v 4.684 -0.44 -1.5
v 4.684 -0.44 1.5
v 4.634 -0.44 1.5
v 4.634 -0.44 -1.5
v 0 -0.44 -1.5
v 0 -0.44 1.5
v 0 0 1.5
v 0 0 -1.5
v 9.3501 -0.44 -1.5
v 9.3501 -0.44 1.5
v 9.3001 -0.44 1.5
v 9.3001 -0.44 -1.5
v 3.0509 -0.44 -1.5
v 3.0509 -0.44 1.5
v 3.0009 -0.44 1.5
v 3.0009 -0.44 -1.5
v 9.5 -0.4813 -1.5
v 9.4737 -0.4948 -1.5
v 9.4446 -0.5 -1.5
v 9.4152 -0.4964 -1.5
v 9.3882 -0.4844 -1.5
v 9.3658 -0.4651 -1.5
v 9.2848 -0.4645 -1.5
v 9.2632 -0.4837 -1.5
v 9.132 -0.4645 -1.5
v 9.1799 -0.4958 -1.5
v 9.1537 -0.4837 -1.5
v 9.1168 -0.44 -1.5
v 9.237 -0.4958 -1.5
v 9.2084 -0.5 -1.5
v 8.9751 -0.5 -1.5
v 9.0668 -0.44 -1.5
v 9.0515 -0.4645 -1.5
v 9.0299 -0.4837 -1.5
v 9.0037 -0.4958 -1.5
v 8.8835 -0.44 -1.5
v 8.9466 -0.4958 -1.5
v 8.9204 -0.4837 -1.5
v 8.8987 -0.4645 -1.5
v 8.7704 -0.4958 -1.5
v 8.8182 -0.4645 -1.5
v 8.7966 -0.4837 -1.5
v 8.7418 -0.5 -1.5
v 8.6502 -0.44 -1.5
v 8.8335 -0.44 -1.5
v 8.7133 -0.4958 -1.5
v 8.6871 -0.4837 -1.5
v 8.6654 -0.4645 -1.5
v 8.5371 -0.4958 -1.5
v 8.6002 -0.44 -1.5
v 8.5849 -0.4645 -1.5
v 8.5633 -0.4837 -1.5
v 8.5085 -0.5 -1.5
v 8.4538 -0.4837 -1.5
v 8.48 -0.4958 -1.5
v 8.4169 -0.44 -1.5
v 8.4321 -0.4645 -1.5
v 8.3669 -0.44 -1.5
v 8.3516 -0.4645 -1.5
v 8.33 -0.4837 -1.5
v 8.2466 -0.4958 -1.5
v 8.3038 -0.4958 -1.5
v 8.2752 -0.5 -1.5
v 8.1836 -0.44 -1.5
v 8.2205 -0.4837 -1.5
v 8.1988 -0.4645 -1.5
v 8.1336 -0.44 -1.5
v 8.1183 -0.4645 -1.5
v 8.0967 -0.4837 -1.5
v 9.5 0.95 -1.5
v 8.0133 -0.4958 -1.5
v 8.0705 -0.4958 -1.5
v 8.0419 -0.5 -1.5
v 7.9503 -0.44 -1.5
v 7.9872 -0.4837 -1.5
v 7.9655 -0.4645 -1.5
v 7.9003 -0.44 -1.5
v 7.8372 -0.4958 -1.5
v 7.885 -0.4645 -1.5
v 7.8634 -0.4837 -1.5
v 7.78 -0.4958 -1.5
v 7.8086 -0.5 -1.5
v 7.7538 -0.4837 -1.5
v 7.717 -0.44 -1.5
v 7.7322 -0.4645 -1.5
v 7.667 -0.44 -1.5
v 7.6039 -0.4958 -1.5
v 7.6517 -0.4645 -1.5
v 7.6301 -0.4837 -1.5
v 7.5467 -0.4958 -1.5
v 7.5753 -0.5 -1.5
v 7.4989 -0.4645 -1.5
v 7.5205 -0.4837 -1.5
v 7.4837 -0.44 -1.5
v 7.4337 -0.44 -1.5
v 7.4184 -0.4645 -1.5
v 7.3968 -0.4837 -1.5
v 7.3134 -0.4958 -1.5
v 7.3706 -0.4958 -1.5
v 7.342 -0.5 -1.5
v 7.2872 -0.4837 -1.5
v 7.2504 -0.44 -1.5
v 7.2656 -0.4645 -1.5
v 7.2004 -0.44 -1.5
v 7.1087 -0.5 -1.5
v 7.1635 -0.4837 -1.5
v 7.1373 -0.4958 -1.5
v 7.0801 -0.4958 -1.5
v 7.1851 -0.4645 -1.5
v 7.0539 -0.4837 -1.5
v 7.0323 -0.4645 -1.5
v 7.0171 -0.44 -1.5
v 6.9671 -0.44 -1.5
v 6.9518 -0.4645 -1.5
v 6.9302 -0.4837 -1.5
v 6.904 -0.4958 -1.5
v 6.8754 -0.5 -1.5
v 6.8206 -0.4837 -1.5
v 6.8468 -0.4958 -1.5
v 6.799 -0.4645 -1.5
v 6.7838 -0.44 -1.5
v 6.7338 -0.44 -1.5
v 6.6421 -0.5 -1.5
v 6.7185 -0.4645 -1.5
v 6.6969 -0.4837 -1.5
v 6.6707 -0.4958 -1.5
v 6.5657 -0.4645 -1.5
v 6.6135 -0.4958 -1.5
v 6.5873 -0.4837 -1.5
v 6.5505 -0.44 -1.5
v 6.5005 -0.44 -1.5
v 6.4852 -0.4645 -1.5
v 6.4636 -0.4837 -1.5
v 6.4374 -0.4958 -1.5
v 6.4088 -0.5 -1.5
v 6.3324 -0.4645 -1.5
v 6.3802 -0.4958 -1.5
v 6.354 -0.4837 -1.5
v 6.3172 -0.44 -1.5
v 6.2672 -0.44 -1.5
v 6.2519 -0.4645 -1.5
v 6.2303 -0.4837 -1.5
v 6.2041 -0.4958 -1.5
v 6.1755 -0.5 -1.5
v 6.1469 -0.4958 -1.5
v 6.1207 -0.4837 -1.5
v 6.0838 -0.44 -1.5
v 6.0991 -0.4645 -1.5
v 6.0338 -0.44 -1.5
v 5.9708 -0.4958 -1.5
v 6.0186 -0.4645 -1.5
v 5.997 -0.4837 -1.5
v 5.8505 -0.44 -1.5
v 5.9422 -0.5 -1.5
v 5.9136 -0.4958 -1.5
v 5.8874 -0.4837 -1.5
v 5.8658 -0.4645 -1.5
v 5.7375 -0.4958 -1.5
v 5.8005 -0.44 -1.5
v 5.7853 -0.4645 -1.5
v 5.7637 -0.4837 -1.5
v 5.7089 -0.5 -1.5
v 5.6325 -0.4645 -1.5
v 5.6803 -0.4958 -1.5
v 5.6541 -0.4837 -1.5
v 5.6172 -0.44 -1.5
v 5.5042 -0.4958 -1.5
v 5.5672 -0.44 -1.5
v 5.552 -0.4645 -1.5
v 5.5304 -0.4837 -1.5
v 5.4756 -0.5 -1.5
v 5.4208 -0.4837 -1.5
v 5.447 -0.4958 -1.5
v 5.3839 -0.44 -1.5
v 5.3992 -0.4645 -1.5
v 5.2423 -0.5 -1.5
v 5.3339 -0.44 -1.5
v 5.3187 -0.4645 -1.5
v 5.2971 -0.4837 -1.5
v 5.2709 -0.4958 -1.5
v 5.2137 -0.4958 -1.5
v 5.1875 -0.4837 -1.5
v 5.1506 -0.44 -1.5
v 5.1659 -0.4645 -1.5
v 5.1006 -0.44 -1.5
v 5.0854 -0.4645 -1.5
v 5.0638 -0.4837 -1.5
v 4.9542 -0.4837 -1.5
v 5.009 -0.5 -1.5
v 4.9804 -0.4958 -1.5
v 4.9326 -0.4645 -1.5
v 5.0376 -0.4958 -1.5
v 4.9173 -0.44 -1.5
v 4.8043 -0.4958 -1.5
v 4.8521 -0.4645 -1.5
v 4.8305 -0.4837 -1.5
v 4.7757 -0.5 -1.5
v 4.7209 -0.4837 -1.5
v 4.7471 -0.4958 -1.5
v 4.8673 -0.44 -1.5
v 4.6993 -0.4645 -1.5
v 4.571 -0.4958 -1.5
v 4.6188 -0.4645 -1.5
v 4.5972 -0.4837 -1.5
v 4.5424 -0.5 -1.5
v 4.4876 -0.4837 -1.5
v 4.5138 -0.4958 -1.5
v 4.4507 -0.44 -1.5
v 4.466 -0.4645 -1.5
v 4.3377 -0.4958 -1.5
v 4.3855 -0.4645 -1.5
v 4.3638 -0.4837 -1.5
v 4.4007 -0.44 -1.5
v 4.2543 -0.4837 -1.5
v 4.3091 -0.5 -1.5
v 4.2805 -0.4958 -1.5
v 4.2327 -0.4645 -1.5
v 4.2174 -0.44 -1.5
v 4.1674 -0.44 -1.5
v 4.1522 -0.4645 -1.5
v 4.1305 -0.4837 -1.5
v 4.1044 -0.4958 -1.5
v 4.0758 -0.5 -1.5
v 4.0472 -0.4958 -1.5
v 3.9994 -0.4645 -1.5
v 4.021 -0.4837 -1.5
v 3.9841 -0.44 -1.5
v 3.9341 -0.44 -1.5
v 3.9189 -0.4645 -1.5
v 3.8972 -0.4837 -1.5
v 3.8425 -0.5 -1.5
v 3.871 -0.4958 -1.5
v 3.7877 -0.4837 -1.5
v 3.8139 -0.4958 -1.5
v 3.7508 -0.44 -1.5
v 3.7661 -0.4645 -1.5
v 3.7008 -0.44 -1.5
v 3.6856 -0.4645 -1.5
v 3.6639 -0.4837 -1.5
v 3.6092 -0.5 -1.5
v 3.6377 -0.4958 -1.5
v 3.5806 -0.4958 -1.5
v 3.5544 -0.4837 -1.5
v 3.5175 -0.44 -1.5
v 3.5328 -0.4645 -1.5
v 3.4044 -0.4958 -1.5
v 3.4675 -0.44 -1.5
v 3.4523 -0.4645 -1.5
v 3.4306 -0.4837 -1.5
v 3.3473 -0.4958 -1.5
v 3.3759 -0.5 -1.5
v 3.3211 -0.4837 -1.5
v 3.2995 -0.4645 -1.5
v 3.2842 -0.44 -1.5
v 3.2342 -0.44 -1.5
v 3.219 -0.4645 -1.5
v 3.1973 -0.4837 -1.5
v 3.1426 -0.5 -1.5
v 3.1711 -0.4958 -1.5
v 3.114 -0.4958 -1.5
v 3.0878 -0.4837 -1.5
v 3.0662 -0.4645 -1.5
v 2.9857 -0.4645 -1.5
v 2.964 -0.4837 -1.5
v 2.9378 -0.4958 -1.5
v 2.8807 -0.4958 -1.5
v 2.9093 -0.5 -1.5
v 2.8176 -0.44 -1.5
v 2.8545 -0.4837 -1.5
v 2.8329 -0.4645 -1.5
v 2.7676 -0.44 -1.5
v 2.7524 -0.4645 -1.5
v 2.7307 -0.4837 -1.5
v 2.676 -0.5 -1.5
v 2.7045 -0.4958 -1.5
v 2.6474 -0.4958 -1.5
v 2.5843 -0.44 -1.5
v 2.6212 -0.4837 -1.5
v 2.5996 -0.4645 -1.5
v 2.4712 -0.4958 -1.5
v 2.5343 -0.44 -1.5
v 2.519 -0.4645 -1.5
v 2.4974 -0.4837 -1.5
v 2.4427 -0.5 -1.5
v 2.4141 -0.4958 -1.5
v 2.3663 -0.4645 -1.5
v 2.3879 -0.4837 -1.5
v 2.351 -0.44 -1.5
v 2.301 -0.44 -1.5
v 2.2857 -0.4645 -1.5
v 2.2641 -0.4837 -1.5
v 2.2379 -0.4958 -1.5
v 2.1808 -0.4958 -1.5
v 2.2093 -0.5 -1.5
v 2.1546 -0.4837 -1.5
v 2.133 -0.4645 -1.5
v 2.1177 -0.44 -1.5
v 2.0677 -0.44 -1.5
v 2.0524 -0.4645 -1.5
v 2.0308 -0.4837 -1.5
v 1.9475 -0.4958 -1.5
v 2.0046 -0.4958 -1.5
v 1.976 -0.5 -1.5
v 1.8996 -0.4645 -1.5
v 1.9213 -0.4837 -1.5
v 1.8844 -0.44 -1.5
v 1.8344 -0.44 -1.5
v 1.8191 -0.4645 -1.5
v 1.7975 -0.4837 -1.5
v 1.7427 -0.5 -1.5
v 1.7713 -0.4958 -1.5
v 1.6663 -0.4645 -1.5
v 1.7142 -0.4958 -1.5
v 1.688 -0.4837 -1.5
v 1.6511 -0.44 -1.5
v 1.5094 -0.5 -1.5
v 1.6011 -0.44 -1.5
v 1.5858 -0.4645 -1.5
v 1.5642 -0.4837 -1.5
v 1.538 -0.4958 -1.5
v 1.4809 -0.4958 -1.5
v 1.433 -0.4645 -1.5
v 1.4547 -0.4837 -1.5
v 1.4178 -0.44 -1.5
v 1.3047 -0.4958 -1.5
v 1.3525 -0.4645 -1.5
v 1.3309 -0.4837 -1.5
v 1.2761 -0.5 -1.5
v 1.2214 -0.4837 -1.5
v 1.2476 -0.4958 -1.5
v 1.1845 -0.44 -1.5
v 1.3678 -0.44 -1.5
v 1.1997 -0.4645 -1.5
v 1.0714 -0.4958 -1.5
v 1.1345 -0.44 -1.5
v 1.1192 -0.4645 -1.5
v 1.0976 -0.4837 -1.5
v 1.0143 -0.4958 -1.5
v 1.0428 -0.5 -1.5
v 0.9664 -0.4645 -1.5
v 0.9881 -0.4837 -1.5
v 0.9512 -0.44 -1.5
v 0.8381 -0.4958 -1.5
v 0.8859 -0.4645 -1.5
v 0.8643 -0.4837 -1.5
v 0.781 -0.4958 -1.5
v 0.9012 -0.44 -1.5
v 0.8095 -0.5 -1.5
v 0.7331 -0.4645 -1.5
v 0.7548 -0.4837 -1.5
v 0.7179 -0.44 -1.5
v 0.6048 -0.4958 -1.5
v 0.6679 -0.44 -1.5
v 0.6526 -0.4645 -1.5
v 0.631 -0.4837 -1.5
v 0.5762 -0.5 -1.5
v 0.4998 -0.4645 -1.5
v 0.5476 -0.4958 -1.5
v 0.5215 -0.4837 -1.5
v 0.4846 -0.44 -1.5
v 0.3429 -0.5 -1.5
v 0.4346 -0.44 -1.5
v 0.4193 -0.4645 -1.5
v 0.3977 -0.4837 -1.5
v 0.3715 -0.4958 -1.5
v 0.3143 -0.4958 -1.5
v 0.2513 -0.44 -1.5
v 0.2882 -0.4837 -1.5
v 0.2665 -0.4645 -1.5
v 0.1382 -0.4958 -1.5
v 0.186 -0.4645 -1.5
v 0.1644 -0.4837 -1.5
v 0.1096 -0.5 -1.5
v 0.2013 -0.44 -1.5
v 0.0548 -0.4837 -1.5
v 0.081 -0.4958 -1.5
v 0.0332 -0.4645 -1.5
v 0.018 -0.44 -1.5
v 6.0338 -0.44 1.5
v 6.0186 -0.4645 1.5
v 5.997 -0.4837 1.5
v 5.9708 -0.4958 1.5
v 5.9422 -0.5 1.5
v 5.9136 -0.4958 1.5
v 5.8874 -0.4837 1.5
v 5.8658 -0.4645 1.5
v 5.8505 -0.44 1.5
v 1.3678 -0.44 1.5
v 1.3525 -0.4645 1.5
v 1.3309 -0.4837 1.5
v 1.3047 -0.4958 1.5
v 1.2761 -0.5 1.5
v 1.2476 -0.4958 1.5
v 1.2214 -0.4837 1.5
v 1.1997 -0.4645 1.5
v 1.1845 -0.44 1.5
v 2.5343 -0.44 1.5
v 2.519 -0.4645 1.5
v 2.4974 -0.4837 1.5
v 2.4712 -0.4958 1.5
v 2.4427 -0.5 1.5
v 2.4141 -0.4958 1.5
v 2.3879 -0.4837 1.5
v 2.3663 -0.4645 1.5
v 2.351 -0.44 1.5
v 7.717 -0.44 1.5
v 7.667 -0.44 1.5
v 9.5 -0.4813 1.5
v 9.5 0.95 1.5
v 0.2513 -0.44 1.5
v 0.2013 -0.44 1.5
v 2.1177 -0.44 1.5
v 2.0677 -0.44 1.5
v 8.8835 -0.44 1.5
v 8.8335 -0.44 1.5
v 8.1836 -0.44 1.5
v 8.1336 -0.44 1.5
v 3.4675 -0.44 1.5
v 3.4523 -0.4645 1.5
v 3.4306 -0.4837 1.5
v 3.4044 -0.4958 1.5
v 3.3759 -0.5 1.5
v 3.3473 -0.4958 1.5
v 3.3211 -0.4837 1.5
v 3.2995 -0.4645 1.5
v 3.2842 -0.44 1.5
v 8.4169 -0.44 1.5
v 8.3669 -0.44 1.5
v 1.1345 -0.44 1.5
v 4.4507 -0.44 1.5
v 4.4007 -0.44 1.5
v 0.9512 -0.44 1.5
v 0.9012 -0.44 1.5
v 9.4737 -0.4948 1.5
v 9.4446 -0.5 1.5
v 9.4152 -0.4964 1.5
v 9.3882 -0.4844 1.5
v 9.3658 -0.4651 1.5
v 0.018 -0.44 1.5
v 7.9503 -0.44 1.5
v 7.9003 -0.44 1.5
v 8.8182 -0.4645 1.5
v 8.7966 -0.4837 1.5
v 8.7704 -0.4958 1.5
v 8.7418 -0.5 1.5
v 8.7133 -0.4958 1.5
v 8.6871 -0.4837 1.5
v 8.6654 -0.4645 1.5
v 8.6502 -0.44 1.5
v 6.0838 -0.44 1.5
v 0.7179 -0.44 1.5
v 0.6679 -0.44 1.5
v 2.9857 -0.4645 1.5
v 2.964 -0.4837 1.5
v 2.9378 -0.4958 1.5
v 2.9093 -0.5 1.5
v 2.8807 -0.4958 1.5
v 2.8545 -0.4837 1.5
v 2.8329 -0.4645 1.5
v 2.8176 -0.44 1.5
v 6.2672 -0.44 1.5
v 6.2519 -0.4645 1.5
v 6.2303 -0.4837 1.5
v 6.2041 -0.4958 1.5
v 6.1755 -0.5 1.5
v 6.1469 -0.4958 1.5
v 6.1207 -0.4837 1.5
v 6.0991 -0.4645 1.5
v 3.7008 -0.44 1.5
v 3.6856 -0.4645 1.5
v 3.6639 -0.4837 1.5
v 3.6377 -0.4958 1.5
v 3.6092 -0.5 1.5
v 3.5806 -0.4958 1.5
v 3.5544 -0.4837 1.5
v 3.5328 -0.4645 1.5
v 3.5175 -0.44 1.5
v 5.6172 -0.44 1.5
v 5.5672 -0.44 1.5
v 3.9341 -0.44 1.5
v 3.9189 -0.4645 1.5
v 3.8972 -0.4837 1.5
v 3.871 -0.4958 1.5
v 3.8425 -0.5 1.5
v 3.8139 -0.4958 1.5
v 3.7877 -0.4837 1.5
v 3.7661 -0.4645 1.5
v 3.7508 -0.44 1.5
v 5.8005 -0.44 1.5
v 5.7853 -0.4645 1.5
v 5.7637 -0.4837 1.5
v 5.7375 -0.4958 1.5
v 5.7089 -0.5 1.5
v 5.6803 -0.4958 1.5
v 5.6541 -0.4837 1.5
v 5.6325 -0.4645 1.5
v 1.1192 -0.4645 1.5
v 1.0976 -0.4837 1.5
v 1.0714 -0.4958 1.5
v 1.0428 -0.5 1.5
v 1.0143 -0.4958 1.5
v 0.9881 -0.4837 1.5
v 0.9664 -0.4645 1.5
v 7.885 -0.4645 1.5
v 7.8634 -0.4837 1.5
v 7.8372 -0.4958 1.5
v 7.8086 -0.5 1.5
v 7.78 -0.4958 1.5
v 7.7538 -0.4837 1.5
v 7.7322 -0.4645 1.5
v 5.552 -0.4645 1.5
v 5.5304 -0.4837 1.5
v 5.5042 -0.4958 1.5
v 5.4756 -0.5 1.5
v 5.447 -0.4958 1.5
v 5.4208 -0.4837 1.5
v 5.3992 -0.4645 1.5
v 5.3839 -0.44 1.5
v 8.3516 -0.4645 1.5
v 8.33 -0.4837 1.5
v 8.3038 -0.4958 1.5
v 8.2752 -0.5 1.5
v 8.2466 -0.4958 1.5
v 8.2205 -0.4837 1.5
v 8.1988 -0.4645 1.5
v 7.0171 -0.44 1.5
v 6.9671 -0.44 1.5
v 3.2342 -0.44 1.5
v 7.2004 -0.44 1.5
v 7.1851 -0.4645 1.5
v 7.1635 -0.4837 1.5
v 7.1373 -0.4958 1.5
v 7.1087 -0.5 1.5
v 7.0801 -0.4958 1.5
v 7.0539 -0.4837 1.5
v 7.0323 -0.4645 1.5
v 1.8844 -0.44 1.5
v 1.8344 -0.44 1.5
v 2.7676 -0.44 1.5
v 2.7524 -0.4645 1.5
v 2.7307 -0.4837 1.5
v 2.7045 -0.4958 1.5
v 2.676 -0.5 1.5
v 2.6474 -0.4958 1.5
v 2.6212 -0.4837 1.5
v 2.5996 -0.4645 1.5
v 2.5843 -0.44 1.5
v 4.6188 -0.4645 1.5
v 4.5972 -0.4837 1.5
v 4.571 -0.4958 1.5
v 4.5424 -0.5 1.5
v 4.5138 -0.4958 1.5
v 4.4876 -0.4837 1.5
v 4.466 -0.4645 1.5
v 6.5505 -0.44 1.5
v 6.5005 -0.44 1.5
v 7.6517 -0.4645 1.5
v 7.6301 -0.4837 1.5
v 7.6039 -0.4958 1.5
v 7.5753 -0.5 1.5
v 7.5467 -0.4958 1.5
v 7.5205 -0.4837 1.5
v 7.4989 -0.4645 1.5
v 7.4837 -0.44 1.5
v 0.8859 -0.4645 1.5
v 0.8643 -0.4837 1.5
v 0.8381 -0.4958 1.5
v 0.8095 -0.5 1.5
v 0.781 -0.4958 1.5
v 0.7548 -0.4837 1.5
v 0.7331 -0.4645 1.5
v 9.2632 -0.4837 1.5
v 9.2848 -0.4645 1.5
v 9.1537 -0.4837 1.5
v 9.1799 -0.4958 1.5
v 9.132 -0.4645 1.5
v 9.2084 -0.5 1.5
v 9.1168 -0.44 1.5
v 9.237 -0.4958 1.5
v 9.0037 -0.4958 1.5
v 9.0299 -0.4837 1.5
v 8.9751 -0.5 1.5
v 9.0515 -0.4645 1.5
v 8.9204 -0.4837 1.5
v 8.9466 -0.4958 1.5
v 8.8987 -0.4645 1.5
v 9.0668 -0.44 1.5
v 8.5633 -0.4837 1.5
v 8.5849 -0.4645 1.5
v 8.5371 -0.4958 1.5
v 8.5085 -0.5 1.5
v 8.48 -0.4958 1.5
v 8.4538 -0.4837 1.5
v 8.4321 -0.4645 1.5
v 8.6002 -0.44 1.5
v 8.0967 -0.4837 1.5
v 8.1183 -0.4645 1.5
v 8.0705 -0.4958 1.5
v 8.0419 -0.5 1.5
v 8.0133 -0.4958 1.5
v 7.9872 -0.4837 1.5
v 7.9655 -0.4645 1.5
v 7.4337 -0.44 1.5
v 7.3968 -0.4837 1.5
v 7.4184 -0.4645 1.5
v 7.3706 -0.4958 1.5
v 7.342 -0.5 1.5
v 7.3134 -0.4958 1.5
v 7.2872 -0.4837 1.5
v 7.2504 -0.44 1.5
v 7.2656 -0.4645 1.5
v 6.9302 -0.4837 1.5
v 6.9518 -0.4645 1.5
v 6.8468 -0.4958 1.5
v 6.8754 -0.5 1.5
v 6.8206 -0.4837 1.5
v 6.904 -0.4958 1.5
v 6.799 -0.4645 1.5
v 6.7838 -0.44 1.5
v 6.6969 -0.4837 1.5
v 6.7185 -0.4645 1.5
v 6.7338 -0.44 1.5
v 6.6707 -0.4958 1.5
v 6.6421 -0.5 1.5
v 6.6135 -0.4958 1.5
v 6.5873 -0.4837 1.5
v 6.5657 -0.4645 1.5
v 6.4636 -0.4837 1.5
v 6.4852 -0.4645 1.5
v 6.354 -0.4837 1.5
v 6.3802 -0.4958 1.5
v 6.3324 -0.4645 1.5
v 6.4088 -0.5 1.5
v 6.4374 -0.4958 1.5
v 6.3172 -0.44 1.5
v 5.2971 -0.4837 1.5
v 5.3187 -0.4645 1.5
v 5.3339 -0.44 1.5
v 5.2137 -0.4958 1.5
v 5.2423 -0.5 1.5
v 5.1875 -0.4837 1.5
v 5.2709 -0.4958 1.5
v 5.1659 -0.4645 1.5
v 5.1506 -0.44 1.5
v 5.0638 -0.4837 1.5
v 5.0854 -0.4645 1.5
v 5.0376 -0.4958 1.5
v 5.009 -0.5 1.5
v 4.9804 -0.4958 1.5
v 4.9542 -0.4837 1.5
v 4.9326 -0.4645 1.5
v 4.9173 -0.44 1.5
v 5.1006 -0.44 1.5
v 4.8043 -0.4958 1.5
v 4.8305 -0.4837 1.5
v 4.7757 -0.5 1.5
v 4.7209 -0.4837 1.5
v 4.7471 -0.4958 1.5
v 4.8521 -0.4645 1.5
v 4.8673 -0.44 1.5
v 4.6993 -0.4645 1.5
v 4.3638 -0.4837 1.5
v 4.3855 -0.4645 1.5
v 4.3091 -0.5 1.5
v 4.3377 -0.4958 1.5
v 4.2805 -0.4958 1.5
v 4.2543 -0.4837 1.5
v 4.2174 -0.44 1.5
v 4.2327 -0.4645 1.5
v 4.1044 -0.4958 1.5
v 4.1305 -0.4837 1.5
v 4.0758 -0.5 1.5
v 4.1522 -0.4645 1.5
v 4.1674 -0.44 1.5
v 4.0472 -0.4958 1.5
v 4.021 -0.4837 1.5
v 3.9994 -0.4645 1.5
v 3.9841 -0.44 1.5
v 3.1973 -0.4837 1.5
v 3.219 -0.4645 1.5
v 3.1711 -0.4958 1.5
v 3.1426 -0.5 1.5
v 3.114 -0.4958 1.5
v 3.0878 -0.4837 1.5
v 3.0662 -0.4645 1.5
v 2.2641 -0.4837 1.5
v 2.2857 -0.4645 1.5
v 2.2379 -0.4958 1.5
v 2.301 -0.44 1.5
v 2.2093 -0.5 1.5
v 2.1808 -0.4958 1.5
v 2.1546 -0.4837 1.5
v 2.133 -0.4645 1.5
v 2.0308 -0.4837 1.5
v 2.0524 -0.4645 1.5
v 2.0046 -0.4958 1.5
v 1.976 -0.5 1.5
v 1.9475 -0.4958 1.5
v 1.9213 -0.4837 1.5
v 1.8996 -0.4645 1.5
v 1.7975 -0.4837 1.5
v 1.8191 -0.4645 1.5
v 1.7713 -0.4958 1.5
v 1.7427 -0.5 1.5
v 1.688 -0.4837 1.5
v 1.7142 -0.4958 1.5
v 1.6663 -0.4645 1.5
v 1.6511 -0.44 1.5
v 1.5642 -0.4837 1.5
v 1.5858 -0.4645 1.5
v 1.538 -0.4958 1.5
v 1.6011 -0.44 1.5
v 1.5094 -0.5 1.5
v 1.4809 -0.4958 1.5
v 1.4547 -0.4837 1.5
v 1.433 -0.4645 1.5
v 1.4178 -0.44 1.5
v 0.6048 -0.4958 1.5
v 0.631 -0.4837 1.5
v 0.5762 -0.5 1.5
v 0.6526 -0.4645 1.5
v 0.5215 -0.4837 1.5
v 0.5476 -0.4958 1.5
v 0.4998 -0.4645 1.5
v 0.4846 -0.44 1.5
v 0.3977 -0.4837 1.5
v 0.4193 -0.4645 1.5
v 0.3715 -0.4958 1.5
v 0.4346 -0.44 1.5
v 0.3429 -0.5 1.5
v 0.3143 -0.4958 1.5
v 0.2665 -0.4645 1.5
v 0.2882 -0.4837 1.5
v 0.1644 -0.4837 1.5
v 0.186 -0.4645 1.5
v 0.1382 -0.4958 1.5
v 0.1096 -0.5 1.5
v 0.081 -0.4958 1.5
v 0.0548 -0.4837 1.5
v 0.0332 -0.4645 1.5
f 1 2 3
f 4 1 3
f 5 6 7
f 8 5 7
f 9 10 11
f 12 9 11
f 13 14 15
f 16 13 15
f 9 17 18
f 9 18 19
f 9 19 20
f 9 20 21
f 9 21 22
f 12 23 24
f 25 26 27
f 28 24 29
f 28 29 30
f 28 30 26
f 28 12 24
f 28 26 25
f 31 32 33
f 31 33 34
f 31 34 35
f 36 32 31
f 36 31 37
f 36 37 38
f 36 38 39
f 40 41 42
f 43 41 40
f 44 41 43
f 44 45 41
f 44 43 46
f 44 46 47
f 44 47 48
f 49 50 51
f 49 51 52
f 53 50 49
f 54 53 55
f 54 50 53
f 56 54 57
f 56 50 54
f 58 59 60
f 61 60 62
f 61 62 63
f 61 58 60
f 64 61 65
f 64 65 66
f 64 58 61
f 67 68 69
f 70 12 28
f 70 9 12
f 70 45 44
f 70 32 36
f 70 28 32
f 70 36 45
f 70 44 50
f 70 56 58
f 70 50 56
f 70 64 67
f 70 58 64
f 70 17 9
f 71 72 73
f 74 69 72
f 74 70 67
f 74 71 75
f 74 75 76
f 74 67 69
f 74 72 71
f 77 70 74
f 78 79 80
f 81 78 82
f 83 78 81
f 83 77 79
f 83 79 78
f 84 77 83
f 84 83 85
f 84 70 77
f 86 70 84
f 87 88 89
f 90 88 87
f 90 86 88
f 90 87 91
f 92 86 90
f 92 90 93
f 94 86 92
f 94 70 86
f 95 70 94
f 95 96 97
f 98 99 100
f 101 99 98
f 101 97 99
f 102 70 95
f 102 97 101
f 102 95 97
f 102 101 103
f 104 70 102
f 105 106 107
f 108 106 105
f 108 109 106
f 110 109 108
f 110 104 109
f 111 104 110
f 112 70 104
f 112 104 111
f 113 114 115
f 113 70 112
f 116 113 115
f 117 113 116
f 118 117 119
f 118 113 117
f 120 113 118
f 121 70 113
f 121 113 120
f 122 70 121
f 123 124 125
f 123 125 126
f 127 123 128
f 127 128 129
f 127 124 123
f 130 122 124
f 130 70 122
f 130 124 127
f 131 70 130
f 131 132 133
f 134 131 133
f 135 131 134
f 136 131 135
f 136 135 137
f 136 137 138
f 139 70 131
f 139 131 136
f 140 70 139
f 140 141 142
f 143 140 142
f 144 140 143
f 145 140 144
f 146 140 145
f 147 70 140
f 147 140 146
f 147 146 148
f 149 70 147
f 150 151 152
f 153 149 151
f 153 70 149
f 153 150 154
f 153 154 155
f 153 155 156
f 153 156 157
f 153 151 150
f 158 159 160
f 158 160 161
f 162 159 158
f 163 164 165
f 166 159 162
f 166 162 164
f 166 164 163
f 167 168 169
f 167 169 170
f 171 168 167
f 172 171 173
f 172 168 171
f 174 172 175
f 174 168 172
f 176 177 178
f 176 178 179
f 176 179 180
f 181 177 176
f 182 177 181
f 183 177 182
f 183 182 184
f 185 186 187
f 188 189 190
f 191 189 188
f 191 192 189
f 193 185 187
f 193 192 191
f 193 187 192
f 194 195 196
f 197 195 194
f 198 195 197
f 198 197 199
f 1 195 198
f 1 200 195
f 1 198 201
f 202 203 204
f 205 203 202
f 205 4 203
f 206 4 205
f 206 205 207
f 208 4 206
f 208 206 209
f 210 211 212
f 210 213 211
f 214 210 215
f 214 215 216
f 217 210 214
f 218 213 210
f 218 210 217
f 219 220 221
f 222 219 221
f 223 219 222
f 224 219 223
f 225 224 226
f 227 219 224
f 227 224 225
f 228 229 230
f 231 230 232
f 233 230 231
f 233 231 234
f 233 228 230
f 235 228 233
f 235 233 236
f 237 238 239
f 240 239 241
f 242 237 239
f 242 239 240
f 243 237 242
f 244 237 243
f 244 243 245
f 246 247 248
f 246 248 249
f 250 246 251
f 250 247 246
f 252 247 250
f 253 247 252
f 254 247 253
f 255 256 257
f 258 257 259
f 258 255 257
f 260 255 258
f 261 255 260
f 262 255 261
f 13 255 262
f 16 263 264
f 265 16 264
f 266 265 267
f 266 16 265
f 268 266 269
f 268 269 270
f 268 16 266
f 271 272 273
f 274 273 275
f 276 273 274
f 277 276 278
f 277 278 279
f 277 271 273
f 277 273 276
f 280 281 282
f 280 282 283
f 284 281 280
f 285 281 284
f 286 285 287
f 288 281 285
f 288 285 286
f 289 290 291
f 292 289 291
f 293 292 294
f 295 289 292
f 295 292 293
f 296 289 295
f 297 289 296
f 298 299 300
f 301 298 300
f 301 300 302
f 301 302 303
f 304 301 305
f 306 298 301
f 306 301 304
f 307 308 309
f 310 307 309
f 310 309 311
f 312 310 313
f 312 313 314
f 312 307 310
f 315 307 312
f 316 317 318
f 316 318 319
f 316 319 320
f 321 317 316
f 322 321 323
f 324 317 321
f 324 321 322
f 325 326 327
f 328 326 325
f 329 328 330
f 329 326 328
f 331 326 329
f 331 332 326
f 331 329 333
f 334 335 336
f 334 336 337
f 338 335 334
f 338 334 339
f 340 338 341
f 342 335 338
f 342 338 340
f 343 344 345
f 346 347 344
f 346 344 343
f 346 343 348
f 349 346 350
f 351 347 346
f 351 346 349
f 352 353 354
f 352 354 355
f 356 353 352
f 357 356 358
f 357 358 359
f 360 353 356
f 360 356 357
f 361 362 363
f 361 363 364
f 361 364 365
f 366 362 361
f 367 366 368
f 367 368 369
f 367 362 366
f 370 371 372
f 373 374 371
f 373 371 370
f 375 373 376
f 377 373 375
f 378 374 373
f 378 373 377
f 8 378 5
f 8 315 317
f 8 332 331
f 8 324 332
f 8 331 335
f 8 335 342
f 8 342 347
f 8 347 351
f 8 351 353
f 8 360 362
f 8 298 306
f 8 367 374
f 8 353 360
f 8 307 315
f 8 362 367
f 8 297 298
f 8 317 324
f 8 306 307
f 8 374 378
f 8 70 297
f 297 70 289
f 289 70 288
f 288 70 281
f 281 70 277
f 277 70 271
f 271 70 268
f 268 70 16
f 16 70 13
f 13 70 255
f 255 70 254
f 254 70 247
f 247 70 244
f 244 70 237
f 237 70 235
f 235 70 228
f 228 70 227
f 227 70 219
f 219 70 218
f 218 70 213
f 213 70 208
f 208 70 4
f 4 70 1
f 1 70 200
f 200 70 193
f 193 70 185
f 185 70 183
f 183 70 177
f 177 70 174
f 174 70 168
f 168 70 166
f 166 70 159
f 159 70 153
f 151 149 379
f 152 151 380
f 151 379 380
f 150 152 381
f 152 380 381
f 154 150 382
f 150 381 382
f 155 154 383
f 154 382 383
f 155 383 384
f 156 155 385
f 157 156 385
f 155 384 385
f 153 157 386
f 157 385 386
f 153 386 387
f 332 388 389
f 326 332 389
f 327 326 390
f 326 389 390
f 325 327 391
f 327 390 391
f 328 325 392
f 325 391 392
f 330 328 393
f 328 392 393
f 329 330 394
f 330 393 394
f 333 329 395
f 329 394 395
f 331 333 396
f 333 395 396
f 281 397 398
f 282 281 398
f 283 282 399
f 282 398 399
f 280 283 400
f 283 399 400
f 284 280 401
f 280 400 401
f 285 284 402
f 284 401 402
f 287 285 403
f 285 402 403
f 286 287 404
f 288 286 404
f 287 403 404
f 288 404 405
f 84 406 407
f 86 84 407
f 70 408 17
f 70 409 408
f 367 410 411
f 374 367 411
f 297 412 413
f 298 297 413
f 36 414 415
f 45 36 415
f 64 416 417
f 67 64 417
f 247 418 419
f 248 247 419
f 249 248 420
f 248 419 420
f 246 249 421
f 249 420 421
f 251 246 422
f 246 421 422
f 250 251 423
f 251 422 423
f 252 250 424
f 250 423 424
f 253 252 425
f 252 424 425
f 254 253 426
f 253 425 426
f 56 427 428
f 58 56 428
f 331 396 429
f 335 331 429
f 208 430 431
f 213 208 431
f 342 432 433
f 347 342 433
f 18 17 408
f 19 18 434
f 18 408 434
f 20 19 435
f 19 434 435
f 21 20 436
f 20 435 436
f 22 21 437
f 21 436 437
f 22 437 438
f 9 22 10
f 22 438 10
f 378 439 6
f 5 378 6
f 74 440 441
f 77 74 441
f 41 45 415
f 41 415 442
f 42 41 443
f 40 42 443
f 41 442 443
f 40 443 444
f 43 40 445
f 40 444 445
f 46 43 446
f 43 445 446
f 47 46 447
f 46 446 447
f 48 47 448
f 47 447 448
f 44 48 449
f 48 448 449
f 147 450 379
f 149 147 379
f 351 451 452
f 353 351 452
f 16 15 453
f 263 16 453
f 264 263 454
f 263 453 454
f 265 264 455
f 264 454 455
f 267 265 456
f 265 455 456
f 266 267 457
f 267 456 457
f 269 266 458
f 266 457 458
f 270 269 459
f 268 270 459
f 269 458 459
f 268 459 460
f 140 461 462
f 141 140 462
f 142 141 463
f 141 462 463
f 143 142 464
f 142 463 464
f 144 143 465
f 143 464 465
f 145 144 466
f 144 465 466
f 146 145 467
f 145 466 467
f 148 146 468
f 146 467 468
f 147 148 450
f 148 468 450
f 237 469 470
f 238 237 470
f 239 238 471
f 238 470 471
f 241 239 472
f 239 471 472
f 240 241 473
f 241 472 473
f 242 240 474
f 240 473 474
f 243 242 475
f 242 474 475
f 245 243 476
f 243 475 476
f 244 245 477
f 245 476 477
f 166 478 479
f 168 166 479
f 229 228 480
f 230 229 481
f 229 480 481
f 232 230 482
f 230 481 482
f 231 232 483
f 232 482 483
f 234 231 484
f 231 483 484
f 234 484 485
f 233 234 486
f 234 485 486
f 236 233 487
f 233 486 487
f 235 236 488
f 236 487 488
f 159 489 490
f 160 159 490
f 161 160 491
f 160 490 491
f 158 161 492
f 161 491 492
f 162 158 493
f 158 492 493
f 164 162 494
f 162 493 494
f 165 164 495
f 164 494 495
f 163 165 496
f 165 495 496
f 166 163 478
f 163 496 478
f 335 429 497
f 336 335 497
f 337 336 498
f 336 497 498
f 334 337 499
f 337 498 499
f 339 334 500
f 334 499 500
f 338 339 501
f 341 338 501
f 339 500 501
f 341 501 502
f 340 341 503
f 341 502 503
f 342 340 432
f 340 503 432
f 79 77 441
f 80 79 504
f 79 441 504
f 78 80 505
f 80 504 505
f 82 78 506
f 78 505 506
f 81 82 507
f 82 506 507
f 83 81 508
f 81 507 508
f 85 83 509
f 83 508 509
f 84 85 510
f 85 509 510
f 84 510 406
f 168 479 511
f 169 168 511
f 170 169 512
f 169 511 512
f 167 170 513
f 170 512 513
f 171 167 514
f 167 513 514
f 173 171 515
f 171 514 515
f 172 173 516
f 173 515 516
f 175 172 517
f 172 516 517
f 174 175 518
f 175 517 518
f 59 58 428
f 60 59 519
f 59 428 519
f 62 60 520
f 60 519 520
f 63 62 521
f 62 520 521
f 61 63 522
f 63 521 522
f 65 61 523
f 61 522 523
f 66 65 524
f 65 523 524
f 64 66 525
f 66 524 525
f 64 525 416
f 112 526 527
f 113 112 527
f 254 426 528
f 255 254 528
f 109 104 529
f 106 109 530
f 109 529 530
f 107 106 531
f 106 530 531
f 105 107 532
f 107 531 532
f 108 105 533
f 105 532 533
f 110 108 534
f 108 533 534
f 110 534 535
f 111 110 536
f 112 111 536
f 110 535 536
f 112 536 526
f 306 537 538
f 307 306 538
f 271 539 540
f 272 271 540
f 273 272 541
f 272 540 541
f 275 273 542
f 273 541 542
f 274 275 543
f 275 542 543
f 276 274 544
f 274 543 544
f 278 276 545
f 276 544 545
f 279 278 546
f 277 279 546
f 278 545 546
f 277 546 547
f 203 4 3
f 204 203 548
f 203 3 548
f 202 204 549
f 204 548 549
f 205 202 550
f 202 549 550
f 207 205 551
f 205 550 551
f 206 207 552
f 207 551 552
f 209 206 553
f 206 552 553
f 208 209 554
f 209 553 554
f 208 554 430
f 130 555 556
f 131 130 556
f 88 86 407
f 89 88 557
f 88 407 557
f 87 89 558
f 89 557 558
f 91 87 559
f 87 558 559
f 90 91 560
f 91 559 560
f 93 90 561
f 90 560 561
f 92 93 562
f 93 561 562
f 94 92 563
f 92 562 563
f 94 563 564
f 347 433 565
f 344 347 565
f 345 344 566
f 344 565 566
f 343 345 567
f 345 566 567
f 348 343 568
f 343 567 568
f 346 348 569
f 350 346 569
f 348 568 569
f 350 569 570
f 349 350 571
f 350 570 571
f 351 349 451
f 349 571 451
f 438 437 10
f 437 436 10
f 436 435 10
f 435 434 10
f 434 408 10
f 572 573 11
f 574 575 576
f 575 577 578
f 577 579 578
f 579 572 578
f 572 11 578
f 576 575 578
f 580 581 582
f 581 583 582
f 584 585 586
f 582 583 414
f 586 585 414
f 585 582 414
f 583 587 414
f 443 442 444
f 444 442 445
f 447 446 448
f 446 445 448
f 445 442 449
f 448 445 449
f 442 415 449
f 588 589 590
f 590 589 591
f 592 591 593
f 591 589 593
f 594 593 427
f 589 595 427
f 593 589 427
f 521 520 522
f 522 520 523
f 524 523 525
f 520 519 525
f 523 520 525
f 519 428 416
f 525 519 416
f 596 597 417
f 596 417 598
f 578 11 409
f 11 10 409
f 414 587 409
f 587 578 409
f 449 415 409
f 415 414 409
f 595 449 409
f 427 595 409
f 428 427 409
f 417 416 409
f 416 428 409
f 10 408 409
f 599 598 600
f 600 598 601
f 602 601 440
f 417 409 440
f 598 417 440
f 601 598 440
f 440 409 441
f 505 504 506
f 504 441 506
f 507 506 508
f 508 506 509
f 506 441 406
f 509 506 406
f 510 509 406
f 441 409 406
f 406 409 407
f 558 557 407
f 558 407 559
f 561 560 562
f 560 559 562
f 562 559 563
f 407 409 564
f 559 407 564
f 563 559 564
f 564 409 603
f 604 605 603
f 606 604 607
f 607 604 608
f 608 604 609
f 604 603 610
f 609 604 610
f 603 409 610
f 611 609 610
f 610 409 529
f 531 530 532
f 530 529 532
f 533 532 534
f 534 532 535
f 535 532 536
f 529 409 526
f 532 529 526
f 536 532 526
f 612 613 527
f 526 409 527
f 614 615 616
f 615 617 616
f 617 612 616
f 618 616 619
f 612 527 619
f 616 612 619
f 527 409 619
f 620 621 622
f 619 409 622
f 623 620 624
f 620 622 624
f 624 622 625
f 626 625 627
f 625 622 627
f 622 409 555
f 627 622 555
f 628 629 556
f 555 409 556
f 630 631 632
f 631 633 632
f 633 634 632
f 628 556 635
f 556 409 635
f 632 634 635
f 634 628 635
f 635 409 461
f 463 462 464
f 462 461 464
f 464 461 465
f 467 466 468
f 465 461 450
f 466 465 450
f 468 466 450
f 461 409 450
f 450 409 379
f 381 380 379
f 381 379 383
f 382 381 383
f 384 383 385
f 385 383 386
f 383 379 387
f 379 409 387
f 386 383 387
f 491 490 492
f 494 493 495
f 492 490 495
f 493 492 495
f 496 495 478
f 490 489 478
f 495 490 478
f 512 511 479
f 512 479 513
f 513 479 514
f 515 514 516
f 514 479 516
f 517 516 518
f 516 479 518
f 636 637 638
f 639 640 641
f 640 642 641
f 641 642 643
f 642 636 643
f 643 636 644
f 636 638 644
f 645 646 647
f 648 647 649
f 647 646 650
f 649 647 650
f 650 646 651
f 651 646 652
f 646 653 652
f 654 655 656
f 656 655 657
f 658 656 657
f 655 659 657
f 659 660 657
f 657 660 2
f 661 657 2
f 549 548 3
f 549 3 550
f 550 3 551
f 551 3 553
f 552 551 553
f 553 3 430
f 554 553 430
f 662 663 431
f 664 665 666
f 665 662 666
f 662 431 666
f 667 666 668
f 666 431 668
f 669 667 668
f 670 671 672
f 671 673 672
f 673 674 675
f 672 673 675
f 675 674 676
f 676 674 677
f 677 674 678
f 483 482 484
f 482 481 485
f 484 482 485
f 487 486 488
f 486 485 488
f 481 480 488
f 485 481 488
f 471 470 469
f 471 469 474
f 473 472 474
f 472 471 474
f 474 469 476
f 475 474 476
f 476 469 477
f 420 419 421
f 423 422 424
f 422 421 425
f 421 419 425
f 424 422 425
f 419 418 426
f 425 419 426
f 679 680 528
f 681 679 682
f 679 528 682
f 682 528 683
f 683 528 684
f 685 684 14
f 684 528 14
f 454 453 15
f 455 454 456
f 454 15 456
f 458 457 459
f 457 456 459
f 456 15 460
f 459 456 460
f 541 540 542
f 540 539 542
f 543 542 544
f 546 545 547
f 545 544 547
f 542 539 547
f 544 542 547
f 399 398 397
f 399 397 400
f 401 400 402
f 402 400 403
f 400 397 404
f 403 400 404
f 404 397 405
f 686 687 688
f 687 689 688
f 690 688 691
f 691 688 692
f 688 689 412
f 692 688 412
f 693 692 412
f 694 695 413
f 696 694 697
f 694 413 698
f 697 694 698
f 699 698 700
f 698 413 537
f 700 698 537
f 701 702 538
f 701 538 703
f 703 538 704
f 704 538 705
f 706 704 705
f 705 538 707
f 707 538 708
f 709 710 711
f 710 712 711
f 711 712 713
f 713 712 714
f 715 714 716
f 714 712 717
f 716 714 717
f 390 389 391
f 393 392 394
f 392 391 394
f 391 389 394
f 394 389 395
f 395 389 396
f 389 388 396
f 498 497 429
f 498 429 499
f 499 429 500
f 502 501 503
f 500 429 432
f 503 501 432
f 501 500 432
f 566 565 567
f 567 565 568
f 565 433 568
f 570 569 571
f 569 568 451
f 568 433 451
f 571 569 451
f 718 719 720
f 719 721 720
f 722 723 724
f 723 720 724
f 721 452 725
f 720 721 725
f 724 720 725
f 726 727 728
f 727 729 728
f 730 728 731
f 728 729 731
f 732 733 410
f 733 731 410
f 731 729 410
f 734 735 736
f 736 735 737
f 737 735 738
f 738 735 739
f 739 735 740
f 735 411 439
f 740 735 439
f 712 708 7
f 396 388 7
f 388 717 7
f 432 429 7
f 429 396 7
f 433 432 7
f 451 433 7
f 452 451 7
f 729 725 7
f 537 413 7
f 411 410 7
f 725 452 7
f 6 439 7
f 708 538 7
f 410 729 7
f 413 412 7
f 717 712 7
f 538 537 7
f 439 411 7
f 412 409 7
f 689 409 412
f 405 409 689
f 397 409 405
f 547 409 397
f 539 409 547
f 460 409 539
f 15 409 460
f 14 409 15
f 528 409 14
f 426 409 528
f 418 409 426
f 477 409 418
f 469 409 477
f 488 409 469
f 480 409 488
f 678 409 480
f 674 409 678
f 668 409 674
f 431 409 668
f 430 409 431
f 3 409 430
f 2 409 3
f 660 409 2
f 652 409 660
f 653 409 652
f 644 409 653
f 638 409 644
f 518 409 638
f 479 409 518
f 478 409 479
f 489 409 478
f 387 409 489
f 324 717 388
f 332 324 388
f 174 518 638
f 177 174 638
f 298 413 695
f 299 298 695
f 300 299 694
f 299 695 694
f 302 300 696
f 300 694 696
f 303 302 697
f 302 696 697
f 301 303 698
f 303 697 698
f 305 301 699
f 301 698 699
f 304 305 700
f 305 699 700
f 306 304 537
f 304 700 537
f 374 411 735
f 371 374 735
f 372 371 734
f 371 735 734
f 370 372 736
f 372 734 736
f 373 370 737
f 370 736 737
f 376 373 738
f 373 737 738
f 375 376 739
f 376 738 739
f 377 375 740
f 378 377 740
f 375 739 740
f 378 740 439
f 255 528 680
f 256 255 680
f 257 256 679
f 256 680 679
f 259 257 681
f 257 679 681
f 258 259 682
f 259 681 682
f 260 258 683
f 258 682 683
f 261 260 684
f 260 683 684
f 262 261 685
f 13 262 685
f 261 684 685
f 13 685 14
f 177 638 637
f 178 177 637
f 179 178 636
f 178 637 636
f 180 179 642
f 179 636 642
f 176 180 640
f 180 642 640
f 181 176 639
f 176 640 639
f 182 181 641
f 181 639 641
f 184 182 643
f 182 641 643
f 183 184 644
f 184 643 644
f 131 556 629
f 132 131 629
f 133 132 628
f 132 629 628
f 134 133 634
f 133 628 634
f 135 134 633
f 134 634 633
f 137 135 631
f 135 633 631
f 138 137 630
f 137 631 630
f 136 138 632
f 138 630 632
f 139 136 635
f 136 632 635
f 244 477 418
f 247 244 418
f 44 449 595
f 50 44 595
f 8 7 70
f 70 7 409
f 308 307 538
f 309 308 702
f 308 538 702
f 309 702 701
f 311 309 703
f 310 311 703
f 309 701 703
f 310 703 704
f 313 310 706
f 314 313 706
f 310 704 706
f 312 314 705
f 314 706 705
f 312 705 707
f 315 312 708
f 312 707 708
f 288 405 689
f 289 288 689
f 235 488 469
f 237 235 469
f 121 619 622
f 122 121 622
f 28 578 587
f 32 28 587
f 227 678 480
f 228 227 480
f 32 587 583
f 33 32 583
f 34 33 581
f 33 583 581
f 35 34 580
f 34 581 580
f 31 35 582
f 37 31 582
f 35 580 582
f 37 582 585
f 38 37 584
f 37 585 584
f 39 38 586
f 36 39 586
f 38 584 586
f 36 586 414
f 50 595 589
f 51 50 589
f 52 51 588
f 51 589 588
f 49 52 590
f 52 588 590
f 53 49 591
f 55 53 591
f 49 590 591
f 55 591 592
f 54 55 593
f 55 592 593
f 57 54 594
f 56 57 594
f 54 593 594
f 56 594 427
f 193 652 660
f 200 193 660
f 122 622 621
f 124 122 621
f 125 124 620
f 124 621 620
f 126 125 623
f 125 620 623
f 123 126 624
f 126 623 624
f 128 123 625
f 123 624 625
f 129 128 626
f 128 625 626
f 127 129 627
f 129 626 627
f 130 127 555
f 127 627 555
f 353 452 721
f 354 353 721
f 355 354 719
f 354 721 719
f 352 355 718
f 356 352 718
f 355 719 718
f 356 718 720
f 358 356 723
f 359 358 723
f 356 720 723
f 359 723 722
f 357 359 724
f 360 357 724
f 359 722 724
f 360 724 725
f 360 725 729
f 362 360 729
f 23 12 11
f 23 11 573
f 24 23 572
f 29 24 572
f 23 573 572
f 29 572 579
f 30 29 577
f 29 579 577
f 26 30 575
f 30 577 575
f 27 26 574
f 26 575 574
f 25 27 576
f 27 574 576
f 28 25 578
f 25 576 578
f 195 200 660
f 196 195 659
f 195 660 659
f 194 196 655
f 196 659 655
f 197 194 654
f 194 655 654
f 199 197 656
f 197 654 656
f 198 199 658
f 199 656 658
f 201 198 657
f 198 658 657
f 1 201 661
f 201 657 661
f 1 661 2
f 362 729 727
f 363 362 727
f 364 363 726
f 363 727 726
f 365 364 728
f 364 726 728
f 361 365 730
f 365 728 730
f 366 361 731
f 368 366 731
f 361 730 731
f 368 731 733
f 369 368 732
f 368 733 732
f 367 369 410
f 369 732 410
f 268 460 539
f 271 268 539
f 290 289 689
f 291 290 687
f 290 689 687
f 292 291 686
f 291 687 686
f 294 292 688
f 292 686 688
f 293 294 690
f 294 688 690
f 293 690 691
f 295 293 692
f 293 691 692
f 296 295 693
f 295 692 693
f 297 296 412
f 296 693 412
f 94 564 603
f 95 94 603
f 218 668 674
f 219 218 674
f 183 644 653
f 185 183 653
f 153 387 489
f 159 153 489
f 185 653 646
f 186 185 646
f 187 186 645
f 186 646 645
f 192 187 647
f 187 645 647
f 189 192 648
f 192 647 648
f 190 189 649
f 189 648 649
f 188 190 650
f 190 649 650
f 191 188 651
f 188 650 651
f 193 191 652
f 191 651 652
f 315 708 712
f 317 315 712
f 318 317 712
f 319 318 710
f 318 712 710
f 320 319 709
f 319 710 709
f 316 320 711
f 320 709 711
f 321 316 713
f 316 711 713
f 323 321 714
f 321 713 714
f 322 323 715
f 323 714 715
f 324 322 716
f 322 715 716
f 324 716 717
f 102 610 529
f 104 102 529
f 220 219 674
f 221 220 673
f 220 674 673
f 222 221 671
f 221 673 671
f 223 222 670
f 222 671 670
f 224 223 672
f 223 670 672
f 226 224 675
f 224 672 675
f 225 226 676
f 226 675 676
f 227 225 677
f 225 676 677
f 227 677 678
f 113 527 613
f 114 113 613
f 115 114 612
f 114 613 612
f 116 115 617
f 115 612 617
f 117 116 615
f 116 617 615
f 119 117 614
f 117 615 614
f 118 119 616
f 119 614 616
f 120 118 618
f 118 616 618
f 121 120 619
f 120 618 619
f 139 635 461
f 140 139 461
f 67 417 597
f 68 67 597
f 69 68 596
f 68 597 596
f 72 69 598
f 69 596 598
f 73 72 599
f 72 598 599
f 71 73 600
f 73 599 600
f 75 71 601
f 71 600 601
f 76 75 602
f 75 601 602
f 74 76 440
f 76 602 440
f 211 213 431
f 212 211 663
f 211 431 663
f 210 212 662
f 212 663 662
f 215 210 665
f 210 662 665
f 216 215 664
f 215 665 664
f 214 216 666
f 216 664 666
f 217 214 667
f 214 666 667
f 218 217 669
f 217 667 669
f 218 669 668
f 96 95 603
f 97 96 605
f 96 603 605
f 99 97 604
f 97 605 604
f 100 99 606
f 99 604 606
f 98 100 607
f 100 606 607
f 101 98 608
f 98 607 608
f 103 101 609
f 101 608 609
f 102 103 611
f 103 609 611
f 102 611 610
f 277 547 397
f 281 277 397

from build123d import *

# Parameters (mm, degrees)
BOSS_EXTRUDE1_DEPTH     = 1.5
SKETCH2_OUTSIDE_W       = 14.11
SKETCH2_OUTSIDE_H       = 5.61
CUT_EXTRUDE1_DEPTH      = 1
CUT_EXTRUDE1_DEPTH_BACK = 4
CUT_EXTRUDE2_DEPTH      = 0.5


with BuildPart() as part:
    # Sketch1 → Boss-Extrude1 (new body, symmetric)
    with BuildSketch(Plane.XY):
        Polygon((0, 0), (10, 1), (10, -0.5), (0, -0.5), align=None)
    extrude(amount=BOSS_EXTRUDE1_DEPTH, both=True)

    # Sketch2 outside → Cut-Extrude1 (cut, two sides)
    with BuildSketch(Plane.XY.offset(1.5)) as cut_extrude1_sk:
        with Locations((5, 0.25)):
            Rectangle(SKETCH2_OUTSIDE_W, SKETCH2_OUTSIDE_H)
        with BuildLine():
            Line((9.816696972, -0.44), (9.766696972, -0.44))
            ThreePointArc((9.766696972, -0.44), (9.675045458, -0.5), (9.583393944, -0.44))
            Line((9.583393944, -0.44), (9.533393944, -0.44))
            ThreePointArc((9.533393944, -0.44), (9.441742431, -0.5), (9.350090917, -0.44))
            Line((9.350090917, -0.44), (9.300090917, -0.44))
            ThreePointArc((9.300090917, -0.44), (9.208439403, -0.5), (9.116787889, -0.44))
            Line((9.116787889, -0.44), (9.066787889, -0.44))
            ThreePointArc((9.066787889, -0.44), (8.975136375, -0.5), (8.883484861, -0.44))
            Line((8.883484861, -0.44), (8.833484861, -0.44))
            ThreePointArc((8.833484861, -0.44), (8.741833347, -0.5), (8.650181833, -0.44))
            Line((8.650181833, -0.44), (8.600181833, -0.44))
            ThreePointArc((8.600181833, -0.44), (8.508530319, -0.5), (8.416878805, -0.44))
            Line((8.416878805, -0.44), (8.366878805, -0.44))
            ThreePointArc((8.366878805, -0.44), (8.275227292, -0.5), (8.183575778, -0.44))
            Line((8.183575778, -0.44), (8.133575778, -0.44))
            ThreePointArc((8.133575778, -0.44), (8.041924264, -0.5), (7.95027275, -0.44))
            Line((7.95027275, -0.44), (7.90027275, -0.44))
            ThreePointArc((7.90027275, -0.44), (7.808621236, -0.5), (7.716969722, -0.44))
            Line((7.716969722, -0.44), (7.666969722, -0.44))
            ThreePointArc((7.666969722, -0.44), (7.575318208, -0.5), (7.483666694, -0.44))
            Line((7.483666694, -0.44), (7.433666694, -0.44))
            ThreePointArc((7.433666694, -0.44), (7.34201518, -0.5), (7.250363666, -0.44))
            Line((7.250363666, -0.44), (7.200363666, -0.44))
            ThreePointArc((7.200363666, -0.44), (7.108712153, -0.5), (7.017060639, -0.44))
            Line((7.017060639, -0.44), (6.967060639, -0.44))
            ThreePointArc((6.967060639, -0.44), (6.875409125, -0.5), (6.783757611, -0.44))
            Line((6.783757611, -0.44), (6.733757611, -0.44))
            ThreePointArc((6.733757611, -0.44), (6.642106097, -0.5), (6.550454583, -0.44))
            Line((6.550454583, -0.44), (6.500454583, -0.44))
            ThreePointArc((6.500454583, -0.44), (6.408803069, -0.5), (6.317151555, -0.44))
            Line((6.317151555, -0.44), (6.267151555, -0.44))
            ThreePointArc((6.267151555, -0.44), (6.175500041, -0.5), (6.083848527, -0.44))
            Line((6.083848527, -0.44), (6.033848527, -0.44))
            ThreePointArc((6.033848527, -0.44), (5.942197014, -0.5), (5.8505455, -0.44))
            Line((5.8505455, -0.44), (5.8005455, -0.44))
            ThreePointArc((5.8005455, -0.44), (5.708893986, -0.5), (5.617242472, -0.44))
            Line((5.617242472, -0.44), (5.567242472, -0.44))
            ThreePointArc((5.567242472, -0.44), (5.475590958, -0.5), (5.383939444, -0.44))
            Line((5.383939444, -0.44), (5.333939444, -0.44))
            ThreePointArc((5.333939444, -0.44), (5.24228793, -0.5), (5.150636416, -0.44))
            Line((5.150636416, -0.44), (5.100636416, -0.44))
            ThreePointArc((5.100636416, -0.44), (5.008984902, -0.5), (4.917333388, -0.44))
            Line((4.917333388, -0.44), (4.867333388, -0.44))
            ThreePointArc((4.867333388, -0.44), (4.775681875, -0.5), (4.684030361, -0.44))
            Line((4.684030361, -0.44), (4.634030361, -0.44))
            ThreePointArc((4.634030361, -0.44), (4.542378847, -0.5), (4.450727333, -0.44))
            Line((4.450727333, -0.44), (4.400727333, -0.44))
            ThreePointArc((4.400727333, -0.44), (4.309075819, -0.5), (4.217424305, -0.44))
            Line((4.217424305, -0.44), (4.167424305, -0.44))
            ThreePointArc((4.167424305, -0.44), (4.075772791, -0.5), (3.984121277, -0.44))
            Line((3.984121277, -0.44), (3.934121277, -0.44))
            ThreePointArc((3.934121277, -0.44), (3.842469763, -0.5), (3.750818249, -0.44))
            Line((3.750818249, -0.44), (3.700818249, -0.44))
            ThreePointArc((3.700818249, -0.44), (3.609166736, -0.5), (3.517515222, -0.44))
            Line((3.517515222, -0.44), (3.467515222, -0.44))
            ThreePointArc((3.467515222, -0.44), (3.375863708, -0.5), (3.284212194, -0.44))
            Line((3.284212194, -0.44), (3.234212194, -0.44))
            ThreePointArc((3.234212194, -0.44), (3.14256068, -0.5), (3.050909166, -0.44))
            Line((3.050909166, -0.44), (3.000909166, -0.44))
            ThreePointArc((3.000909166, -0.44), (2.909257652, -0.5), (2.817606138, -0.44))
            Line((2.817606138, -0.44), (2.767606138, -0.44))
            ThreePointArc((2.767606138, -0.44), (2.675954624, -0.5), (2.58430311, -0.44))
            Line((2.58430311, -0.44), (2.53430311, -0.44))
            ThreePointArc((2.53430311, -0.44), (2.442651597, -0.5), (2.351000083, -0.44))
            Line((2.351000083, -0.44), (2.301000083, -0.44))
            ThreePointArc((2.301000083, -0.44), (2.209348569, -0.5), (2.117697055, -0.44))
            Line((2.117697055, -0.44), (2.067697055, -0.44))
            ThreePointArc((2.067697055, -0.44), (1.976045541, -0.5), (1.884394027, -0.44))
            Line((1.884394027, -0.44), (1.834394027, -0.44))
            ThreePointArc((1.834394027, -0.44), (1.742742513, -0.5), (1.651090999, -0.44))
            Line((1.651090999, -0.44), (1.601090999, -0.44))
            ThreePointArc((1.601090999, -0.44), (1.509439485, -0.5), (1.417787971, -0.44))
            Line((1.417787971, -0.44), (1.367787971, -0.44))
            ThreePointArc((1.367787971, -0.44), (1.276136458, -0.5), (1.184484944, -0.44))
            Line((1.184484944, -0.44), (1.134484944, -0.44))
            ThreePointArc((1.134484944, -0.44), (1.04283343, -0.5), (0.951181916, -0.44))
            Line((0.951181916, -0.44), (0.901181916, -0.44))
            ThreePointArc((0.901181916, -0.44), (0.809530402, -0.5), (0.717878888, -0.44))
            Line((0.717878888, -0.44), (0.667878888, -0.44))
            ThreePointArc((0.667878888, -0.44), (0.576227374, -0.5), (0.48457586, -0.44))
            Line((0.48457586, -0.44), (0.43457586, -0.44))
            ThreePointArc((0.43457586, -0.44), (0.342924346, -0.5), (0.251272832, -0.44))
            Line((0.251272832, -0.44), (0.201272832, -0.44))
            ThreePointArc((0.201272832, -0.44), (0.109621319, -0.5), (0.017969805, -0.44))
            Line((0.017969805, -0.44), (0, -0.44))
            Line((0, -0.44), (0, 0))
            Line((0, 0), (10, 1))
            Line((10, 1), (10, -0.44))
            ThreePointArc((10, -0.44), (9.908348486, -0.5), (9.816696972, -0.44))
        make_face(mode=Mode.SUBTRACT)
    extrude(amount=CUT_EXTRUDE1_DEPTH, mode=Mode.SUBTRACT)
    extrude(cut_extrude1_sk.sketch, amount=-CUT_EXTRUDE1_DEPTH_BACK, mode=Mode.SUBTRACT)

    # Sketch4 → Cut-Extrude2 (cut)
    with BuildSketch(Plane(origin=(10, 0, 0), x_dir=(0, 0, -1), z_dir=(1, 0, 0))):
        Polygon((-1.5, -0.5), (1.5, -0.5), (1.5, -0.44), (1.5, 1), (-1.5, 1), (-1.500006, -0.44), align=None)
    extrude(amount=-CUT_EXTRUDE2_DEPTH, mode=Mode.SUBTRACT)


solid = part.part
